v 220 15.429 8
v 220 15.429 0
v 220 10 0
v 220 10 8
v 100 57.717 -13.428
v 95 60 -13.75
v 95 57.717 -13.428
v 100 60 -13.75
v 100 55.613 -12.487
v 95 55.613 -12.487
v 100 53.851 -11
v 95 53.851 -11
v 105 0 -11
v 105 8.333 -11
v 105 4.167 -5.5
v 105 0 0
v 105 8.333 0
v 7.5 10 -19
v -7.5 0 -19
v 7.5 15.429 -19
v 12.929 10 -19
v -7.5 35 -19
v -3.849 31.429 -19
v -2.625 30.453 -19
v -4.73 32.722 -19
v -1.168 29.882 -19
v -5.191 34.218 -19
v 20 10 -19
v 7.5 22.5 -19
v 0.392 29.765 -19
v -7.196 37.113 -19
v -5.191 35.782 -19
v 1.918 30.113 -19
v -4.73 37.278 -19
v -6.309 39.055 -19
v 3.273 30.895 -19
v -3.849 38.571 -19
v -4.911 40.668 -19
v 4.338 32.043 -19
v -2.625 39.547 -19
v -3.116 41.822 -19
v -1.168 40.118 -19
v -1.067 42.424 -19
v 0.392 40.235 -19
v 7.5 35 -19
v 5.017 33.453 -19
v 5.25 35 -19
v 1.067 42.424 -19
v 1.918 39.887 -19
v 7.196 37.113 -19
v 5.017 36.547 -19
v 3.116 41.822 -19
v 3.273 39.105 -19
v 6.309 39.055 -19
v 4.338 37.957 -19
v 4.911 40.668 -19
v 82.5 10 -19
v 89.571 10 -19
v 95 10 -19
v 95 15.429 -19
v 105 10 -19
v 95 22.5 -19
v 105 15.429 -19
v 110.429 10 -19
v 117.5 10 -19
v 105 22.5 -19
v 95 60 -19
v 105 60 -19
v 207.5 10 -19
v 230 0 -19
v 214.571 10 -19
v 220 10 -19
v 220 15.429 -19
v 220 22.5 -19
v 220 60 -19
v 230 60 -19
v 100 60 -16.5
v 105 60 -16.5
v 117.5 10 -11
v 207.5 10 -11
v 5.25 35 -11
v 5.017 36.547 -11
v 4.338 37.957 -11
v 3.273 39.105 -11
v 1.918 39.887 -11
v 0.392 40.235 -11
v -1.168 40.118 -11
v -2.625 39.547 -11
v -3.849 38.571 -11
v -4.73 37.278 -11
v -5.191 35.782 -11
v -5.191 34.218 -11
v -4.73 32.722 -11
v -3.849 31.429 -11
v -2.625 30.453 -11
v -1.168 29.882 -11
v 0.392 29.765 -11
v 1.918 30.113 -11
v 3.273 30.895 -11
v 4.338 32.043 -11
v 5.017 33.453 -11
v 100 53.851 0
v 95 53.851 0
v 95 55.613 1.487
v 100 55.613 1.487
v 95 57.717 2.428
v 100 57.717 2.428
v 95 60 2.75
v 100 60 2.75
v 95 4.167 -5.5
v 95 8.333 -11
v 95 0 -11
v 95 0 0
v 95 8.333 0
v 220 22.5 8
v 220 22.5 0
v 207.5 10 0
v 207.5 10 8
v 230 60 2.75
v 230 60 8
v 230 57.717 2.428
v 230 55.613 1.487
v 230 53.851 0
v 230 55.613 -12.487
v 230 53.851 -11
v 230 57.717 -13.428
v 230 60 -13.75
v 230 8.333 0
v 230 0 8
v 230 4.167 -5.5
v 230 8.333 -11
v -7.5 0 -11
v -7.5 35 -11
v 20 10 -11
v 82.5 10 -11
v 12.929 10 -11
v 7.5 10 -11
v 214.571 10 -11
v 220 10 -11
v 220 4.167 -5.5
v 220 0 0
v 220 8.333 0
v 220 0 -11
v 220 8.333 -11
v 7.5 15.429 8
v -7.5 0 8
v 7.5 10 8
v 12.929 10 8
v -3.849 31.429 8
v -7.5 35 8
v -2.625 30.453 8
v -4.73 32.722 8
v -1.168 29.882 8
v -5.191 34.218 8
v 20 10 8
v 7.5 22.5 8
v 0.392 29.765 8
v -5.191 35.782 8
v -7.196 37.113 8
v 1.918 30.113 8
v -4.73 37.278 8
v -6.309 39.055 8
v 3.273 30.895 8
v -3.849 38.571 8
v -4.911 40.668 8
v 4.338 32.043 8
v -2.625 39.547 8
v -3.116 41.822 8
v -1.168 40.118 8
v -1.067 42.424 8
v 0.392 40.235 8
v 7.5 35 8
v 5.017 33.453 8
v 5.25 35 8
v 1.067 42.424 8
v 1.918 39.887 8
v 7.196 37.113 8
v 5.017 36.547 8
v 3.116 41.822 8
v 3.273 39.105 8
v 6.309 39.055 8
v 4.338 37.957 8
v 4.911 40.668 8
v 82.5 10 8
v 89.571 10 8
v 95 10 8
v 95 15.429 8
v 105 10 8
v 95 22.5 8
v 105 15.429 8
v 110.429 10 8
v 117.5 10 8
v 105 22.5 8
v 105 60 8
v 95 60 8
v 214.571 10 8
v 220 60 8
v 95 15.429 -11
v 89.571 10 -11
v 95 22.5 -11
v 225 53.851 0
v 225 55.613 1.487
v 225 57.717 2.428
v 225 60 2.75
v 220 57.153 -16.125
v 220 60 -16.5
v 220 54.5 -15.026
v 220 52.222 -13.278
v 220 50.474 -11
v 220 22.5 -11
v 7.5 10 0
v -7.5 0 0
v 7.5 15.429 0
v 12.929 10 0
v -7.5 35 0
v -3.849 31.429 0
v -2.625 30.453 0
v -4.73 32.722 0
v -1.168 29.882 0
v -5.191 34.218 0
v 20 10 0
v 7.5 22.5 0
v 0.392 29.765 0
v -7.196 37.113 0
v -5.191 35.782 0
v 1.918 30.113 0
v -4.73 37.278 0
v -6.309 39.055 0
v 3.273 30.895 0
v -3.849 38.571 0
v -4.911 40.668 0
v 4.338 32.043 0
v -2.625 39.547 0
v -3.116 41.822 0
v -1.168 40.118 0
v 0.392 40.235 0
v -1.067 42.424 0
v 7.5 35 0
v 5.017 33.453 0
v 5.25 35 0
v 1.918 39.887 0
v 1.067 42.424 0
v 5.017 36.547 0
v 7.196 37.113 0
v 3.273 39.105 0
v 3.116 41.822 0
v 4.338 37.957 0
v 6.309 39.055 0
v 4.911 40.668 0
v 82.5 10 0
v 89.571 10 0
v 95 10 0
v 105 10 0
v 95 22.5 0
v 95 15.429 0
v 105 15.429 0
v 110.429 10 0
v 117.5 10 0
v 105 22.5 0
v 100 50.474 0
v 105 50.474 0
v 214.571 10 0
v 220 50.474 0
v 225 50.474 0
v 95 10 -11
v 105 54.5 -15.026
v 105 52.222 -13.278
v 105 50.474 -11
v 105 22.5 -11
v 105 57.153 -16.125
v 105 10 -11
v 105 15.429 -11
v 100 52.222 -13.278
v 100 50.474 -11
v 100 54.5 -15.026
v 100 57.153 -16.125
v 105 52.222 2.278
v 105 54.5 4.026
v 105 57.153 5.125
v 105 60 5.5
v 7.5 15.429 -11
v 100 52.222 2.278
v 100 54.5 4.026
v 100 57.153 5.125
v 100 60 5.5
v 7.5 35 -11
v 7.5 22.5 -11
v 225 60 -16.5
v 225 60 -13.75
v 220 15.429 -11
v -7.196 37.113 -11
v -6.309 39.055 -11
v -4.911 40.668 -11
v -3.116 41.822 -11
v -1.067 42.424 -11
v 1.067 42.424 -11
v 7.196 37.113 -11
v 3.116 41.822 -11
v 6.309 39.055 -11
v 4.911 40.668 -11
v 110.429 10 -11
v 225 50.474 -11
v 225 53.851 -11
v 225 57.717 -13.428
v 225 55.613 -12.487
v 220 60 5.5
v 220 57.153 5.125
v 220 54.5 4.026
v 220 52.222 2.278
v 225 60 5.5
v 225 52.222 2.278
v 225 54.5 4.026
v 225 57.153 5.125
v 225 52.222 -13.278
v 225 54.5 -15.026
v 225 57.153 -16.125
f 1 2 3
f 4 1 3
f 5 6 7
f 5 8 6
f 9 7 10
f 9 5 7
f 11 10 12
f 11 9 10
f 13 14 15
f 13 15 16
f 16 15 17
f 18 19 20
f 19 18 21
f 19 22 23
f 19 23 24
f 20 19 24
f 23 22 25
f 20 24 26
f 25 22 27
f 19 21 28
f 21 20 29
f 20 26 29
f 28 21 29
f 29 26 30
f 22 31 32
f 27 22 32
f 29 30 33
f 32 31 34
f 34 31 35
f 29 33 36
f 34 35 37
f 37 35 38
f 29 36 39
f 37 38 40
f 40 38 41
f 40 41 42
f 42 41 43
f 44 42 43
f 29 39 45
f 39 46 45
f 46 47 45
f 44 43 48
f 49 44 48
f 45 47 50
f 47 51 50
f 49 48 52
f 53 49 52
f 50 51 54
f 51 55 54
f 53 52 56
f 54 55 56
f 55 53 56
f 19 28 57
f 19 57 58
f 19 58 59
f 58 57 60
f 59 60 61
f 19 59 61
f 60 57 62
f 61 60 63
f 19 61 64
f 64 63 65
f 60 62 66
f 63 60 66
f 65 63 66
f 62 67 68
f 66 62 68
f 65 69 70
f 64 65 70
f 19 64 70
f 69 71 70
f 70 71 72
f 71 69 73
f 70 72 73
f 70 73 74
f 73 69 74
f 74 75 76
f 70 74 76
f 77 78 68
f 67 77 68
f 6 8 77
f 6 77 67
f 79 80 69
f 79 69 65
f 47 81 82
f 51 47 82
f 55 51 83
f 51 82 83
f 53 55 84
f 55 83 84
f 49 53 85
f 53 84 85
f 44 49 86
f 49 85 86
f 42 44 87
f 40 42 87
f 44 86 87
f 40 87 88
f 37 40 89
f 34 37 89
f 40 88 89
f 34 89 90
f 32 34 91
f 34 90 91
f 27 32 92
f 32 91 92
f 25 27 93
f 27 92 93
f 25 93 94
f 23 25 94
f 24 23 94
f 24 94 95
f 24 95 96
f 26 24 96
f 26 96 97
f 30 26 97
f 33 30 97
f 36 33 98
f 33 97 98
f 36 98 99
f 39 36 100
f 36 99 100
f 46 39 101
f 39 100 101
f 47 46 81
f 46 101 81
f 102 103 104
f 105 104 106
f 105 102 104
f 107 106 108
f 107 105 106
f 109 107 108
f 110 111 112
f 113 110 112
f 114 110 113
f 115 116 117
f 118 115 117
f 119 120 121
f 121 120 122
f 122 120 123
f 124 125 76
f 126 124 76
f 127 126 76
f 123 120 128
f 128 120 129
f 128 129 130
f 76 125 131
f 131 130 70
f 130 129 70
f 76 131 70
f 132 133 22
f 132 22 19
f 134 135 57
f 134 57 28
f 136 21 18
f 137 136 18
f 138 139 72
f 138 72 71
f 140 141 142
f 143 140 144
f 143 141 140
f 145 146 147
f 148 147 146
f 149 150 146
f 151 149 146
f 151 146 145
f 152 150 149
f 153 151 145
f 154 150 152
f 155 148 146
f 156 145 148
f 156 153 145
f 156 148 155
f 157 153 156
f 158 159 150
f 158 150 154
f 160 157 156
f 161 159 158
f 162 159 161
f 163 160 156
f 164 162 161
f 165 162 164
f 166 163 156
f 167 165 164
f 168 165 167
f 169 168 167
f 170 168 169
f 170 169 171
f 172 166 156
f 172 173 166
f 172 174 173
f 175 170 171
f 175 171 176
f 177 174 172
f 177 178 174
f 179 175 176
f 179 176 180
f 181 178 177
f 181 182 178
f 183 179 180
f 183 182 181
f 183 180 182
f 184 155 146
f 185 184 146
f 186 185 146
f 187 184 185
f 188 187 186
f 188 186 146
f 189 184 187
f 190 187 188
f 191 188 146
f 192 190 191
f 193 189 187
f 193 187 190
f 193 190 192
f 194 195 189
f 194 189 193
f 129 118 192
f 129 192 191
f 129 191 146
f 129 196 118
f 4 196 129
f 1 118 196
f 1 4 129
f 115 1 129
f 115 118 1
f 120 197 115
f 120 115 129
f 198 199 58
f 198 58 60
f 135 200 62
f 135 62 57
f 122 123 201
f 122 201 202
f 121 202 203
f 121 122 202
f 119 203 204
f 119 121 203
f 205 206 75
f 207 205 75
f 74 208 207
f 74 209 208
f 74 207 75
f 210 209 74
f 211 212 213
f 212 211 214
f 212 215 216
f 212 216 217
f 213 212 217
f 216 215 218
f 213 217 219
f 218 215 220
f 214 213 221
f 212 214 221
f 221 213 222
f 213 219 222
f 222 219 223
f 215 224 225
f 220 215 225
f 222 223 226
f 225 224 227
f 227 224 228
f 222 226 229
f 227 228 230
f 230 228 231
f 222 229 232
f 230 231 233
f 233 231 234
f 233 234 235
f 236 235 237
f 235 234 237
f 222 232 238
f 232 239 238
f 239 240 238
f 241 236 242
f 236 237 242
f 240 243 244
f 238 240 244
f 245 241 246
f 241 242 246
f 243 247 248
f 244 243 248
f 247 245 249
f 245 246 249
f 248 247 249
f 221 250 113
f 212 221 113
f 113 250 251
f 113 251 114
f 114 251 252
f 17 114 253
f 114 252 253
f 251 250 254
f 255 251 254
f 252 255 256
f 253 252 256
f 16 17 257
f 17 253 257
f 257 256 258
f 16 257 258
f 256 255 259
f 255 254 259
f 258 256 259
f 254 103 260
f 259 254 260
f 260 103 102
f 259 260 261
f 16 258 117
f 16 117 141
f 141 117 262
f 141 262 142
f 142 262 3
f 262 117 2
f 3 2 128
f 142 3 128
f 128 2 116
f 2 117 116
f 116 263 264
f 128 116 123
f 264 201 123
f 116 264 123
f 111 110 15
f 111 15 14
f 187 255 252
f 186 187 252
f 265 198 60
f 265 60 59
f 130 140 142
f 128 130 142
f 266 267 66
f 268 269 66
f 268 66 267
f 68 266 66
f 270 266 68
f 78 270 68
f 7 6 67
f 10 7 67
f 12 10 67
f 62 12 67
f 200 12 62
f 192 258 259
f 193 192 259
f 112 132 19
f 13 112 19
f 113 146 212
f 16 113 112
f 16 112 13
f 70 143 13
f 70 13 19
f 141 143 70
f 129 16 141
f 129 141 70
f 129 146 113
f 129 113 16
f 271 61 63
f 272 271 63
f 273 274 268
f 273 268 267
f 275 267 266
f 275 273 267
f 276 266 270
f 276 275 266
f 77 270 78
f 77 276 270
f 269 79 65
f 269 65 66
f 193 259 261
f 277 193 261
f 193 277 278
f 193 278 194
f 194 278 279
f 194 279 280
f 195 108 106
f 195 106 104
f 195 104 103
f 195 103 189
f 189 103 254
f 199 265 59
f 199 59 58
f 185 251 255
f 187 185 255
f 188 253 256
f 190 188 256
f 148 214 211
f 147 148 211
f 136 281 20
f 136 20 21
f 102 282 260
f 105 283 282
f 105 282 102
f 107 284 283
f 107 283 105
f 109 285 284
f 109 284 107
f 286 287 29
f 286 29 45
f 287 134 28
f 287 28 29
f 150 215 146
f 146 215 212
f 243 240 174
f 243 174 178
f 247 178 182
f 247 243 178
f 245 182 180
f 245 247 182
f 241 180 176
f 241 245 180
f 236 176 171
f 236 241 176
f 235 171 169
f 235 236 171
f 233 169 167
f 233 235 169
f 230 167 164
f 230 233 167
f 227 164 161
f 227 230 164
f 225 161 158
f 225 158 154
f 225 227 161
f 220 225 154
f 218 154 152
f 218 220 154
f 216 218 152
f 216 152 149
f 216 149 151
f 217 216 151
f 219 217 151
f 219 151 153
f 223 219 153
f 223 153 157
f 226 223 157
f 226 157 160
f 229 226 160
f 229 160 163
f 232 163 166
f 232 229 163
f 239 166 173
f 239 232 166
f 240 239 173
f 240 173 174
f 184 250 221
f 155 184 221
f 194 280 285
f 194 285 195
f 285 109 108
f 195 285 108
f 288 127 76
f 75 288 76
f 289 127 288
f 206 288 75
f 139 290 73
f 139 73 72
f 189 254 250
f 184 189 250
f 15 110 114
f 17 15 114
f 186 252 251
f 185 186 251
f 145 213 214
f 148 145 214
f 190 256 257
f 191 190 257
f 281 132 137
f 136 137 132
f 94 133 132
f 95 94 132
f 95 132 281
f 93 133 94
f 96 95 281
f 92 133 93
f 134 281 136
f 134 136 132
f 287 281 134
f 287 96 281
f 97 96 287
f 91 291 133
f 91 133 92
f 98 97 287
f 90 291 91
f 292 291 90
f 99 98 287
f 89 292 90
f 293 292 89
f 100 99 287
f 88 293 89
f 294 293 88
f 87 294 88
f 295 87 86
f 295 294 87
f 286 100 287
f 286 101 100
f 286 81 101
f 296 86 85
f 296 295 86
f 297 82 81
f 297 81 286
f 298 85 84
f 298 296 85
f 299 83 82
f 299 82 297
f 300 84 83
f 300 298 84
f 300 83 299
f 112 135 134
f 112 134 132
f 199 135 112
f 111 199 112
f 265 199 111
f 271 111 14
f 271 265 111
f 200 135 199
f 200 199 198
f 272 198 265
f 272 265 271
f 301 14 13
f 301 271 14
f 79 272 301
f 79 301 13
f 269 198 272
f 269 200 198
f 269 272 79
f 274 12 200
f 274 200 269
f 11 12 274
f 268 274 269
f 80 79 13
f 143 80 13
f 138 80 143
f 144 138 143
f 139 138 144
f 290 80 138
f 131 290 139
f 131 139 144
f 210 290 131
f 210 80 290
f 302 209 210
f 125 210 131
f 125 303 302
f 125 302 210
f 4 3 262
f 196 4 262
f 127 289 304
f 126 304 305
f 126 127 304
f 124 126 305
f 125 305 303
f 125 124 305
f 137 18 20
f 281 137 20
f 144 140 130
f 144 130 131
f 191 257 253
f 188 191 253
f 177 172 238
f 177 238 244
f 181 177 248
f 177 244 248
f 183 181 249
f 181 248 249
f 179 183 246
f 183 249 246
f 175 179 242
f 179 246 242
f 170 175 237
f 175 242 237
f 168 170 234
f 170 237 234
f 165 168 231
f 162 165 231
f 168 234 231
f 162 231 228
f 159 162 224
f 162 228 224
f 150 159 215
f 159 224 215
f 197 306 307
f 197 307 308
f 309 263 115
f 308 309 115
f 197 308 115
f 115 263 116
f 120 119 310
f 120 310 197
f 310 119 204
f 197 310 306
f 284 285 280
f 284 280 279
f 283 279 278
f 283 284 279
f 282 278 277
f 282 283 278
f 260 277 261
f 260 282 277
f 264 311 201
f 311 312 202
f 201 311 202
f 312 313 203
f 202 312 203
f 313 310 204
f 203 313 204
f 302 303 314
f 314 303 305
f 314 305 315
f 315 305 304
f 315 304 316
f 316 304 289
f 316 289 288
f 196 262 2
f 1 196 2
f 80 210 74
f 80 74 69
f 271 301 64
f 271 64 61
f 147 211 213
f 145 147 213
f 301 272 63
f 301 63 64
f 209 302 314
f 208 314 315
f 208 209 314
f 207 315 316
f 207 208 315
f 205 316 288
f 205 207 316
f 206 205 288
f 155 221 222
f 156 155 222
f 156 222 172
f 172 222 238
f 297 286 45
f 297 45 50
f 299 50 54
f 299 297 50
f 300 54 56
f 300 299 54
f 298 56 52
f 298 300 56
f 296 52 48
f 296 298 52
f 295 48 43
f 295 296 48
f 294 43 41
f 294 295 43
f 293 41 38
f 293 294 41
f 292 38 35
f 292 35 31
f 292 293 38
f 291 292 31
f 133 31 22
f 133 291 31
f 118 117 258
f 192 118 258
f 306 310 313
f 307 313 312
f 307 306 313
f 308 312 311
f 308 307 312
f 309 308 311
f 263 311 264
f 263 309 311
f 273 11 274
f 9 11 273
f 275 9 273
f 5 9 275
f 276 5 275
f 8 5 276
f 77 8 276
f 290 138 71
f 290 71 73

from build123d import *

# Parameters (mm, degrees)
SKETCH1_R               = 5.25
BOSS_EXTRUDE1_DEPTH     = 8
BOSS_EXTRUDE2_DEPTH     = 10
LPATTERN1_COUNT         = 2
LPATTERN1_PITCH         = 125
MIRROR1_COPY_1_DEPTH    = 10
CUT_EXTRUDE1_START      = -5
SKETCH3_R               = 11
CUT_EXTRUDE1_DEPTH      = 125
CUT_EXTRUDE2_DEPTH      = 10
CUT_EXTRUDE2_DEPTH_BACK = 149.949655924
SKETCH4_R               = 8.25


with BuildPart() as part:
    # Sketch1 → Boss-Extrude1 (new body)
    with BuildSketch(Plane.XY):
        with BuildLine():
            Line((230, 0), (230, 60))
            Line((230, 60), (220, 60))
            Line((220, 60), (220, 22.5))
            Line((220, 22.5), (207.5, 10))
            Line((207.5, 10), (117.5, 10))
            Line((117.5, 10), (105, 22.5))
            Line((105, 22.5), (105, 60))
            Line((105, 60), (95, 60))
            Line((95, 60), (95, 22.5))
            Line((95, 22.5), (82.5, 10))
            Line((82.5, 10), (20, 10))
            Line((20, 10), (7.5, 22.5))
            Line((7.5, 22.5), (7.5, 35))
            ThreePointArc((7.5, 35), (0, 42.5), (-7.5, 35))
            Line((-7.5, 35), (-7.5, 0))
            Line((-7.5, 0), (230, 0))
        make_face()
        Polygon((95, 15.428932188), (95, 10), (89.571067812, 10), align=None, mode=Mode.SUBTRACT)
        Polygon((110.428932188, 10), (105, 10), (105, 15.428932188), align=None, mode=Mode.SUBTRACT)
        Polygon((220, 15.428932188), (220, 10), (214.571067812, 10), align=None, mode=Mode.SUBTRACT)
        with Locations((0, 35)):
            Circle(SKETCH1_R, mode=Mode.SUBTRACT)
        Polygon((7.5, 15.428932188), (12.928932188, 10), (7.5, 10), align=None, mode=Mode.SUBTRACT)
    boss_extrude1 = extrude(amount=BOSS_EXTRUDE1_DEPTH)

    # Sketch2 → Boss-Extrude2 (add)
    with BuildSketch(Plane(origin=(95, 0, 0), x_dir=(0, 0, -1), z_dir=(1, 0, 0))):
        Polygon((5.5, 4.166666667), (0, 8.333333333), (0, 0), (5.5, 0), align=None)
    boss_extrude2 = extrude(amount=BOSS_EXTRUDE2_DEPTH)

    # LPattern1: Boss-Extrude2 ×2
    with Locations(*[(i * LPATTERN1_PITCH, 0, 0) for i in range(1, LPATTERN1_COUNT)]):
        add(boss_extrude2)

    # Mirror1: Boss-Extrude1, Boss-Extrude2 across plane
    add(boss_extrude1.mirror(Plane(origin=(105, 0, -5.5), x_dir=(1, 0, 0), z_dir=(0, 0, 1))))
    add(boss_extrude2.mirror(Plane(origin=(105, 0, -5.5), x_dir=(1, 0, 0), z_dir=(0, 0, 1))))

    # Mirror1 copy 1 sketch → Mirror1 copy 1 (add)
    with BuildSketch(Plane(origin=(220, 0, -11), x_dir=(0, 0, 1), z_dir=(1, 0, 0))):
        Polygon((5.5, -4.166666667), (0, -8.333333333), (0, 0), (5.5, 0), align=None)
    extrude(amount=MIRROR1_COPY_1_DEPTH)

    # Sketch3 → Cut-Extrude1 (cut)
    with BuildSketch(Plane(origin=(105, 0, 0), x_dir=(0, 0, -1), z_dir=(1, 0, 0)).offset(CUT_EXTRUDE1_START)):
        with Locations((5.5, 60)):
            Circle(SKETCH3_R)
    extrude(amount=CUT_EXTRUDE1_DEPTH, mode=Mode.SUBTRACT)

    # Sketch4 → Cut-Extrude2 (cut, two sides: drawn at the far end of the back side and taken through both)
    with BuildSketch(Plane.ZY.offset(-95).offset(-CUT_EXTRUDE2_DEPTH_BACK)):
        with Locations((-5.5, 60)):
            Circle(SKETCH4_R)
    extrude(amount=CUT_EXTRUDE2_DEPTH + CUT_EXTRUDE2_DEPTH_BACK, mode=Mode.SUBTRACT)


solid = part.part
